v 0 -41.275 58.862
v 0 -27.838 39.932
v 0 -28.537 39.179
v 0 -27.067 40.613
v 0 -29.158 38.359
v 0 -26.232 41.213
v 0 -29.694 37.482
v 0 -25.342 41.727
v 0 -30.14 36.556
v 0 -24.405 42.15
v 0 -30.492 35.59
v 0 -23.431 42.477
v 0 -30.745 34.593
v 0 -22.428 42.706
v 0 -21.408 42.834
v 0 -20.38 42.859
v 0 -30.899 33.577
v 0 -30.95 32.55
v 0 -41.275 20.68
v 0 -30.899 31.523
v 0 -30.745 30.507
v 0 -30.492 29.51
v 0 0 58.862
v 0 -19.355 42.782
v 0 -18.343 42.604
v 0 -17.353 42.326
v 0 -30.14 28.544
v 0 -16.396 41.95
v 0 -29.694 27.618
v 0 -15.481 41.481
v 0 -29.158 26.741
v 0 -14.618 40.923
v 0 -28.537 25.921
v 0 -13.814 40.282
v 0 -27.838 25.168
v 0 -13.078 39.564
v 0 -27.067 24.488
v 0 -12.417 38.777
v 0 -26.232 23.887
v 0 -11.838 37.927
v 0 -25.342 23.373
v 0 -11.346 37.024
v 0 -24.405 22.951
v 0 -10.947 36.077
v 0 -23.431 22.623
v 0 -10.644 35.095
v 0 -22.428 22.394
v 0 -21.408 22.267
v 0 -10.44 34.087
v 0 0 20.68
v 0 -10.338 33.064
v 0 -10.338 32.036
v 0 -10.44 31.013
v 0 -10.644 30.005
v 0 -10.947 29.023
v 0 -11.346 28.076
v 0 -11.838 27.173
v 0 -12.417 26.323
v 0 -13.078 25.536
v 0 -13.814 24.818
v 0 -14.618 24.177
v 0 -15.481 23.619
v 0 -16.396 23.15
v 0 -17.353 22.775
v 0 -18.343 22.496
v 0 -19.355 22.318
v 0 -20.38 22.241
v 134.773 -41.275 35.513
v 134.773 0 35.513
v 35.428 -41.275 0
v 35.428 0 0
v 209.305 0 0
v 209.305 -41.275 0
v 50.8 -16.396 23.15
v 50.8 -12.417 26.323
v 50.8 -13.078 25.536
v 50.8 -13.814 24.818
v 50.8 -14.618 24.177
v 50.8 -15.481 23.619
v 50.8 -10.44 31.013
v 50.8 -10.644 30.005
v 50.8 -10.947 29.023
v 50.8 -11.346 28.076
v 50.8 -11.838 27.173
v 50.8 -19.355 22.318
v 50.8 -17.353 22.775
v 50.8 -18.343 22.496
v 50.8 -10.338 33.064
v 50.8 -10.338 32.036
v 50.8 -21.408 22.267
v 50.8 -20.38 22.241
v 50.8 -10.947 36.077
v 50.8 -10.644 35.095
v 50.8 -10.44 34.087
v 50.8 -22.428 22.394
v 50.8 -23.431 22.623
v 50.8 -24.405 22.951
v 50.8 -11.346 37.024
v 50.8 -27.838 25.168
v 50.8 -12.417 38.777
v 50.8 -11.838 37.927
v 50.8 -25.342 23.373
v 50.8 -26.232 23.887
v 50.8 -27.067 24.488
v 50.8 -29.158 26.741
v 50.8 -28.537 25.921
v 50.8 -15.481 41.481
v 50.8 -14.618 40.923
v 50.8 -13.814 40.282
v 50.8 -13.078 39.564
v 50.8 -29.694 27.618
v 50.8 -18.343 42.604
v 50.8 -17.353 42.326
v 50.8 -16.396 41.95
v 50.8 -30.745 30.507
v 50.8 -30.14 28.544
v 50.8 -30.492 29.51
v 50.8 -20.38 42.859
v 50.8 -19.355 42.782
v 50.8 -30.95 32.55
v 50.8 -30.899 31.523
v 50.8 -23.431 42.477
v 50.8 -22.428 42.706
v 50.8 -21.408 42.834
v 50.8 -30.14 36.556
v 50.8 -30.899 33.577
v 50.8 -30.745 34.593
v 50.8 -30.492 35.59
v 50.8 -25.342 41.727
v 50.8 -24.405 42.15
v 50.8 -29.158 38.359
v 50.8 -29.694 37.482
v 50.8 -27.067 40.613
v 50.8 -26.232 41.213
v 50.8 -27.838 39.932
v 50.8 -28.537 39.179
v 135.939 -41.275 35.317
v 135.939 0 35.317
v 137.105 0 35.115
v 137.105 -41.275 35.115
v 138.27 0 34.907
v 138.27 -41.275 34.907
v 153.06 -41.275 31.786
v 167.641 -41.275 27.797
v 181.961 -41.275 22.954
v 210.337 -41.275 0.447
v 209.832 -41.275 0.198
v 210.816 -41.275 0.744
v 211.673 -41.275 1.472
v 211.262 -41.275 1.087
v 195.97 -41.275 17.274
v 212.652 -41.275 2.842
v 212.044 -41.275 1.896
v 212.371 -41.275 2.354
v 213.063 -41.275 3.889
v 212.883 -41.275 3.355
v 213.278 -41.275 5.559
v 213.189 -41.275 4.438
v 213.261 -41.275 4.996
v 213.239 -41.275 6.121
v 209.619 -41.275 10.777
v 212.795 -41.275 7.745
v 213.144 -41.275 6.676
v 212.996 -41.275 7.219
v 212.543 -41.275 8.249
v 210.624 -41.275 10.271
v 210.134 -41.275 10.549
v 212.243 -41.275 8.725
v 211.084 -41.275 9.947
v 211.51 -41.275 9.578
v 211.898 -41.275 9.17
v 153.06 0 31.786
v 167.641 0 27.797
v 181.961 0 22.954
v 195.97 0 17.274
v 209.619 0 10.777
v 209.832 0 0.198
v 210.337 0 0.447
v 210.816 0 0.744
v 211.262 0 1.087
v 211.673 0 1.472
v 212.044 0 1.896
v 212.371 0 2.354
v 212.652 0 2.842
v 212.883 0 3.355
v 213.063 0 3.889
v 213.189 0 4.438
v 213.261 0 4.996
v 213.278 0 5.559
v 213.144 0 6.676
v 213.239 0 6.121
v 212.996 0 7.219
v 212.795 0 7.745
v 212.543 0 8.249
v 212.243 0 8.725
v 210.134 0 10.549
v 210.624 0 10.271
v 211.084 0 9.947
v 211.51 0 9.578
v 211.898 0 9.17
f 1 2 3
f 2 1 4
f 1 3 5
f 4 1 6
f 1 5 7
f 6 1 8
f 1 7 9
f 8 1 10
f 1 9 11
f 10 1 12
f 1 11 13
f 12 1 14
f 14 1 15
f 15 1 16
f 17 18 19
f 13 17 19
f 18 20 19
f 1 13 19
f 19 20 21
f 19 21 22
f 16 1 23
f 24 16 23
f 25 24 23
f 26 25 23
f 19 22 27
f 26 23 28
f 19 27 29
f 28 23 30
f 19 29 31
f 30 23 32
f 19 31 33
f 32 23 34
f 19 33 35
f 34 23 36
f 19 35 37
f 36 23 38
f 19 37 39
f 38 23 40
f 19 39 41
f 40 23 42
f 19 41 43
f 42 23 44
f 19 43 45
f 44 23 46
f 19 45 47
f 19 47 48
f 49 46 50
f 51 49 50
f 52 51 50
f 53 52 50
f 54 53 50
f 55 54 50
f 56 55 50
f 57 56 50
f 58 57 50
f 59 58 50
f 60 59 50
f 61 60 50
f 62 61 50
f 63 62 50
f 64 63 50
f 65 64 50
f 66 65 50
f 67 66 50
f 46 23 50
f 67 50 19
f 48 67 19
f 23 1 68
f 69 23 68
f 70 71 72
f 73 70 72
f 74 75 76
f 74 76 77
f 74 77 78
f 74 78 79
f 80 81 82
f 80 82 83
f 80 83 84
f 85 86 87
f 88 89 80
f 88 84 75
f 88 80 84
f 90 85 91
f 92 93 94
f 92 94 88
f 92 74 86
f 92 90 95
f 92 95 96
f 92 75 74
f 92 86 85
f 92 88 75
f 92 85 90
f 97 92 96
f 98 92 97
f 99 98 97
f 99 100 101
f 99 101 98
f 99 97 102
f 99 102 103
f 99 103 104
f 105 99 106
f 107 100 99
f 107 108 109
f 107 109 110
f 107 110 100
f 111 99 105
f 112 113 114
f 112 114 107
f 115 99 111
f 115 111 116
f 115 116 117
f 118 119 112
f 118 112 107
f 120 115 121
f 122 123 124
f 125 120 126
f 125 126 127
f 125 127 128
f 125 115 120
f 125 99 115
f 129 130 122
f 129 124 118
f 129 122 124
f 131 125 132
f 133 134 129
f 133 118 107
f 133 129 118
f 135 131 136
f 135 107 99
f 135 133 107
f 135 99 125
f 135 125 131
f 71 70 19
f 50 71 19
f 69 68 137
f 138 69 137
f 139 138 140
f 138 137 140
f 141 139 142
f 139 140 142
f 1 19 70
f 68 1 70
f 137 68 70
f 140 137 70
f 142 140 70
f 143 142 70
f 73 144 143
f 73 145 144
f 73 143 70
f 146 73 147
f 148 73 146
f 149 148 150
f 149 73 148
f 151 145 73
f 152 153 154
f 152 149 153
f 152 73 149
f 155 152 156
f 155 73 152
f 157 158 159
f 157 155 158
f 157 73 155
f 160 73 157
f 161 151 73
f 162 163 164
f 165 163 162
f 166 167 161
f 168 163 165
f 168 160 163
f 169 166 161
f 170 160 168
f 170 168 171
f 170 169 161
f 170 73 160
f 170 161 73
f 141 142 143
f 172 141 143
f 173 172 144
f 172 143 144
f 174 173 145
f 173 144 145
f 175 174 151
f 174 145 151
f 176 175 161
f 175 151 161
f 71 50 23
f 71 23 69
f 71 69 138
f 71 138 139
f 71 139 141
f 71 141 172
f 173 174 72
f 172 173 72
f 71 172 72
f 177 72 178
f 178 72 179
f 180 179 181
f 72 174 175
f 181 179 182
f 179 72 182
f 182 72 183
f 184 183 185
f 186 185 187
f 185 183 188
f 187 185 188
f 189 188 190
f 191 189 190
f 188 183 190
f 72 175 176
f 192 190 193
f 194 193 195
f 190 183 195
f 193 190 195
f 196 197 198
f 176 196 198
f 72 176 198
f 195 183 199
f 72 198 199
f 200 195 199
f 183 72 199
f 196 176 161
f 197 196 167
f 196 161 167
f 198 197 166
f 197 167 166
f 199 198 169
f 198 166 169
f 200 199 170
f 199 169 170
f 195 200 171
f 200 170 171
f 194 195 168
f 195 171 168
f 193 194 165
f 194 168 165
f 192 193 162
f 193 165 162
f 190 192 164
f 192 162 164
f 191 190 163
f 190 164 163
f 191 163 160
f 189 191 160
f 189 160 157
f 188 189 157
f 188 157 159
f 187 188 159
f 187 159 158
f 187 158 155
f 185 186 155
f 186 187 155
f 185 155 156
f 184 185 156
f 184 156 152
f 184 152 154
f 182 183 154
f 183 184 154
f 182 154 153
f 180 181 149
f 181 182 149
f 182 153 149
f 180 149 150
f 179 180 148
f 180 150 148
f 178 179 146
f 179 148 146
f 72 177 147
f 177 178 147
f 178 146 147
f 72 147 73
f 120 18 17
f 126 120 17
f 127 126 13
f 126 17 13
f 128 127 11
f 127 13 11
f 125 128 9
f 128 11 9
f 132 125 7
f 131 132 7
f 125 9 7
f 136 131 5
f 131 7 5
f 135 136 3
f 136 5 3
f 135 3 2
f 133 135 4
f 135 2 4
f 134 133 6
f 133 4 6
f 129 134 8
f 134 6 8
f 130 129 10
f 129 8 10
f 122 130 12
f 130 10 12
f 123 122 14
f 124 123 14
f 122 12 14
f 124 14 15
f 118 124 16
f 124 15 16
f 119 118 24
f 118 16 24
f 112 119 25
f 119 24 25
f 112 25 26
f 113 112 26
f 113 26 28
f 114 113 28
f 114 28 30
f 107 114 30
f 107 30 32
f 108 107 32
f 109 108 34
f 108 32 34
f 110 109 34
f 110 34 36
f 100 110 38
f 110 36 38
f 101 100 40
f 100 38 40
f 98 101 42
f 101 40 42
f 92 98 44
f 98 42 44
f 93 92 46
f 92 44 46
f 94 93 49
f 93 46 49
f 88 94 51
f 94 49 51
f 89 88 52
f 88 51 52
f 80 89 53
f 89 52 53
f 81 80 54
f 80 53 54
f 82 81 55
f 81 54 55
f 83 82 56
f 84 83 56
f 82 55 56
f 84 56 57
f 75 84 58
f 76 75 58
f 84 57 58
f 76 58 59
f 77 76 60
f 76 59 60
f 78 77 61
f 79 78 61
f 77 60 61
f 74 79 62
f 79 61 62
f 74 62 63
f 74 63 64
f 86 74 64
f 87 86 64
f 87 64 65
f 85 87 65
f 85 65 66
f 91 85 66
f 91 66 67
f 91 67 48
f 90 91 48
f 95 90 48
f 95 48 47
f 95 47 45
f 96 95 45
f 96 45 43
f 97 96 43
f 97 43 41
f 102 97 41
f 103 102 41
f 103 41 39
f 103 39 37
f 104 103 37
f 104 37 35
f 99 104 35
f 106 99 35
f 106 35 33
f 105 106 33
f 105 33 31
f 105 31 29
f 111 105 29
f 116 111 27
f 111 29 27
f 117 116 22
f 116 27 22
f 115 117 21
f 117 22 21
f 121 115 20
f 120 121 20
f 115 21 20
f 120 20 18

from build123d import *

# Parameters (mm, degrees)
F1_DEPTH = 41.275
F2_R     = 10.3124
F3_DEPTH = 50.8
F5_DEPTH = 41.276


with BuildPart() as f1:
    # F0 (on Front) → F1 (new body)
    with BuildSketch(Plane.XZ):
        Polygon((0, 71.4375), (0, 0), (304.8, 0), (304.8, 15.875), align=None)
    extrude(amount=F1_DEPTH)

    # F2 (on face) → F3 (cut)
    with BuildSketch(Plane(origin=(0, 0, 0), x_dir=(0, -1, 0), z_dir=(-1, 0, 0))):
        with Locations((20.6375, 32.5501)):
            Circle(F2_R)
    extrude(amount=-F3_DEPTH, mode=Mode.SUBTRACT)

    # F4 (on face) → F5 (cut, through all)
    with BuildSketch(Plane.XZ.offset(41.275)):
        Polygon((35.428196, 0), (0, 20.679992), (0, 0), align=None)
        with BuildLine():
            ThreePointArc((138.269581, 34.907452), (174.836839, 25.4808), (209.619478, 10.777256))
            ThreePointArc((209.619478, 10.777256), (213.276315, 5.277363), (209.305078, 0))
            Line((209.305078, 0), (304.8, 0))
            Line((304.8, 0), (304.8, 15.875))
            Line((304.8, 15.875), (0, 71.4375))
            Line((0, 71.4375), (0, 58.861777))
            Line((0, 58.861777), (134.772693, 35.513265))
            ThreePointArc((134.772693, 35.513265), (136.522187, 35.216418), (138.269581, 34.907452))
        make_face()
    extrude(amount=-F5_DEPTH, mode=Mode.SUBTRACT)


solid = f1.part
